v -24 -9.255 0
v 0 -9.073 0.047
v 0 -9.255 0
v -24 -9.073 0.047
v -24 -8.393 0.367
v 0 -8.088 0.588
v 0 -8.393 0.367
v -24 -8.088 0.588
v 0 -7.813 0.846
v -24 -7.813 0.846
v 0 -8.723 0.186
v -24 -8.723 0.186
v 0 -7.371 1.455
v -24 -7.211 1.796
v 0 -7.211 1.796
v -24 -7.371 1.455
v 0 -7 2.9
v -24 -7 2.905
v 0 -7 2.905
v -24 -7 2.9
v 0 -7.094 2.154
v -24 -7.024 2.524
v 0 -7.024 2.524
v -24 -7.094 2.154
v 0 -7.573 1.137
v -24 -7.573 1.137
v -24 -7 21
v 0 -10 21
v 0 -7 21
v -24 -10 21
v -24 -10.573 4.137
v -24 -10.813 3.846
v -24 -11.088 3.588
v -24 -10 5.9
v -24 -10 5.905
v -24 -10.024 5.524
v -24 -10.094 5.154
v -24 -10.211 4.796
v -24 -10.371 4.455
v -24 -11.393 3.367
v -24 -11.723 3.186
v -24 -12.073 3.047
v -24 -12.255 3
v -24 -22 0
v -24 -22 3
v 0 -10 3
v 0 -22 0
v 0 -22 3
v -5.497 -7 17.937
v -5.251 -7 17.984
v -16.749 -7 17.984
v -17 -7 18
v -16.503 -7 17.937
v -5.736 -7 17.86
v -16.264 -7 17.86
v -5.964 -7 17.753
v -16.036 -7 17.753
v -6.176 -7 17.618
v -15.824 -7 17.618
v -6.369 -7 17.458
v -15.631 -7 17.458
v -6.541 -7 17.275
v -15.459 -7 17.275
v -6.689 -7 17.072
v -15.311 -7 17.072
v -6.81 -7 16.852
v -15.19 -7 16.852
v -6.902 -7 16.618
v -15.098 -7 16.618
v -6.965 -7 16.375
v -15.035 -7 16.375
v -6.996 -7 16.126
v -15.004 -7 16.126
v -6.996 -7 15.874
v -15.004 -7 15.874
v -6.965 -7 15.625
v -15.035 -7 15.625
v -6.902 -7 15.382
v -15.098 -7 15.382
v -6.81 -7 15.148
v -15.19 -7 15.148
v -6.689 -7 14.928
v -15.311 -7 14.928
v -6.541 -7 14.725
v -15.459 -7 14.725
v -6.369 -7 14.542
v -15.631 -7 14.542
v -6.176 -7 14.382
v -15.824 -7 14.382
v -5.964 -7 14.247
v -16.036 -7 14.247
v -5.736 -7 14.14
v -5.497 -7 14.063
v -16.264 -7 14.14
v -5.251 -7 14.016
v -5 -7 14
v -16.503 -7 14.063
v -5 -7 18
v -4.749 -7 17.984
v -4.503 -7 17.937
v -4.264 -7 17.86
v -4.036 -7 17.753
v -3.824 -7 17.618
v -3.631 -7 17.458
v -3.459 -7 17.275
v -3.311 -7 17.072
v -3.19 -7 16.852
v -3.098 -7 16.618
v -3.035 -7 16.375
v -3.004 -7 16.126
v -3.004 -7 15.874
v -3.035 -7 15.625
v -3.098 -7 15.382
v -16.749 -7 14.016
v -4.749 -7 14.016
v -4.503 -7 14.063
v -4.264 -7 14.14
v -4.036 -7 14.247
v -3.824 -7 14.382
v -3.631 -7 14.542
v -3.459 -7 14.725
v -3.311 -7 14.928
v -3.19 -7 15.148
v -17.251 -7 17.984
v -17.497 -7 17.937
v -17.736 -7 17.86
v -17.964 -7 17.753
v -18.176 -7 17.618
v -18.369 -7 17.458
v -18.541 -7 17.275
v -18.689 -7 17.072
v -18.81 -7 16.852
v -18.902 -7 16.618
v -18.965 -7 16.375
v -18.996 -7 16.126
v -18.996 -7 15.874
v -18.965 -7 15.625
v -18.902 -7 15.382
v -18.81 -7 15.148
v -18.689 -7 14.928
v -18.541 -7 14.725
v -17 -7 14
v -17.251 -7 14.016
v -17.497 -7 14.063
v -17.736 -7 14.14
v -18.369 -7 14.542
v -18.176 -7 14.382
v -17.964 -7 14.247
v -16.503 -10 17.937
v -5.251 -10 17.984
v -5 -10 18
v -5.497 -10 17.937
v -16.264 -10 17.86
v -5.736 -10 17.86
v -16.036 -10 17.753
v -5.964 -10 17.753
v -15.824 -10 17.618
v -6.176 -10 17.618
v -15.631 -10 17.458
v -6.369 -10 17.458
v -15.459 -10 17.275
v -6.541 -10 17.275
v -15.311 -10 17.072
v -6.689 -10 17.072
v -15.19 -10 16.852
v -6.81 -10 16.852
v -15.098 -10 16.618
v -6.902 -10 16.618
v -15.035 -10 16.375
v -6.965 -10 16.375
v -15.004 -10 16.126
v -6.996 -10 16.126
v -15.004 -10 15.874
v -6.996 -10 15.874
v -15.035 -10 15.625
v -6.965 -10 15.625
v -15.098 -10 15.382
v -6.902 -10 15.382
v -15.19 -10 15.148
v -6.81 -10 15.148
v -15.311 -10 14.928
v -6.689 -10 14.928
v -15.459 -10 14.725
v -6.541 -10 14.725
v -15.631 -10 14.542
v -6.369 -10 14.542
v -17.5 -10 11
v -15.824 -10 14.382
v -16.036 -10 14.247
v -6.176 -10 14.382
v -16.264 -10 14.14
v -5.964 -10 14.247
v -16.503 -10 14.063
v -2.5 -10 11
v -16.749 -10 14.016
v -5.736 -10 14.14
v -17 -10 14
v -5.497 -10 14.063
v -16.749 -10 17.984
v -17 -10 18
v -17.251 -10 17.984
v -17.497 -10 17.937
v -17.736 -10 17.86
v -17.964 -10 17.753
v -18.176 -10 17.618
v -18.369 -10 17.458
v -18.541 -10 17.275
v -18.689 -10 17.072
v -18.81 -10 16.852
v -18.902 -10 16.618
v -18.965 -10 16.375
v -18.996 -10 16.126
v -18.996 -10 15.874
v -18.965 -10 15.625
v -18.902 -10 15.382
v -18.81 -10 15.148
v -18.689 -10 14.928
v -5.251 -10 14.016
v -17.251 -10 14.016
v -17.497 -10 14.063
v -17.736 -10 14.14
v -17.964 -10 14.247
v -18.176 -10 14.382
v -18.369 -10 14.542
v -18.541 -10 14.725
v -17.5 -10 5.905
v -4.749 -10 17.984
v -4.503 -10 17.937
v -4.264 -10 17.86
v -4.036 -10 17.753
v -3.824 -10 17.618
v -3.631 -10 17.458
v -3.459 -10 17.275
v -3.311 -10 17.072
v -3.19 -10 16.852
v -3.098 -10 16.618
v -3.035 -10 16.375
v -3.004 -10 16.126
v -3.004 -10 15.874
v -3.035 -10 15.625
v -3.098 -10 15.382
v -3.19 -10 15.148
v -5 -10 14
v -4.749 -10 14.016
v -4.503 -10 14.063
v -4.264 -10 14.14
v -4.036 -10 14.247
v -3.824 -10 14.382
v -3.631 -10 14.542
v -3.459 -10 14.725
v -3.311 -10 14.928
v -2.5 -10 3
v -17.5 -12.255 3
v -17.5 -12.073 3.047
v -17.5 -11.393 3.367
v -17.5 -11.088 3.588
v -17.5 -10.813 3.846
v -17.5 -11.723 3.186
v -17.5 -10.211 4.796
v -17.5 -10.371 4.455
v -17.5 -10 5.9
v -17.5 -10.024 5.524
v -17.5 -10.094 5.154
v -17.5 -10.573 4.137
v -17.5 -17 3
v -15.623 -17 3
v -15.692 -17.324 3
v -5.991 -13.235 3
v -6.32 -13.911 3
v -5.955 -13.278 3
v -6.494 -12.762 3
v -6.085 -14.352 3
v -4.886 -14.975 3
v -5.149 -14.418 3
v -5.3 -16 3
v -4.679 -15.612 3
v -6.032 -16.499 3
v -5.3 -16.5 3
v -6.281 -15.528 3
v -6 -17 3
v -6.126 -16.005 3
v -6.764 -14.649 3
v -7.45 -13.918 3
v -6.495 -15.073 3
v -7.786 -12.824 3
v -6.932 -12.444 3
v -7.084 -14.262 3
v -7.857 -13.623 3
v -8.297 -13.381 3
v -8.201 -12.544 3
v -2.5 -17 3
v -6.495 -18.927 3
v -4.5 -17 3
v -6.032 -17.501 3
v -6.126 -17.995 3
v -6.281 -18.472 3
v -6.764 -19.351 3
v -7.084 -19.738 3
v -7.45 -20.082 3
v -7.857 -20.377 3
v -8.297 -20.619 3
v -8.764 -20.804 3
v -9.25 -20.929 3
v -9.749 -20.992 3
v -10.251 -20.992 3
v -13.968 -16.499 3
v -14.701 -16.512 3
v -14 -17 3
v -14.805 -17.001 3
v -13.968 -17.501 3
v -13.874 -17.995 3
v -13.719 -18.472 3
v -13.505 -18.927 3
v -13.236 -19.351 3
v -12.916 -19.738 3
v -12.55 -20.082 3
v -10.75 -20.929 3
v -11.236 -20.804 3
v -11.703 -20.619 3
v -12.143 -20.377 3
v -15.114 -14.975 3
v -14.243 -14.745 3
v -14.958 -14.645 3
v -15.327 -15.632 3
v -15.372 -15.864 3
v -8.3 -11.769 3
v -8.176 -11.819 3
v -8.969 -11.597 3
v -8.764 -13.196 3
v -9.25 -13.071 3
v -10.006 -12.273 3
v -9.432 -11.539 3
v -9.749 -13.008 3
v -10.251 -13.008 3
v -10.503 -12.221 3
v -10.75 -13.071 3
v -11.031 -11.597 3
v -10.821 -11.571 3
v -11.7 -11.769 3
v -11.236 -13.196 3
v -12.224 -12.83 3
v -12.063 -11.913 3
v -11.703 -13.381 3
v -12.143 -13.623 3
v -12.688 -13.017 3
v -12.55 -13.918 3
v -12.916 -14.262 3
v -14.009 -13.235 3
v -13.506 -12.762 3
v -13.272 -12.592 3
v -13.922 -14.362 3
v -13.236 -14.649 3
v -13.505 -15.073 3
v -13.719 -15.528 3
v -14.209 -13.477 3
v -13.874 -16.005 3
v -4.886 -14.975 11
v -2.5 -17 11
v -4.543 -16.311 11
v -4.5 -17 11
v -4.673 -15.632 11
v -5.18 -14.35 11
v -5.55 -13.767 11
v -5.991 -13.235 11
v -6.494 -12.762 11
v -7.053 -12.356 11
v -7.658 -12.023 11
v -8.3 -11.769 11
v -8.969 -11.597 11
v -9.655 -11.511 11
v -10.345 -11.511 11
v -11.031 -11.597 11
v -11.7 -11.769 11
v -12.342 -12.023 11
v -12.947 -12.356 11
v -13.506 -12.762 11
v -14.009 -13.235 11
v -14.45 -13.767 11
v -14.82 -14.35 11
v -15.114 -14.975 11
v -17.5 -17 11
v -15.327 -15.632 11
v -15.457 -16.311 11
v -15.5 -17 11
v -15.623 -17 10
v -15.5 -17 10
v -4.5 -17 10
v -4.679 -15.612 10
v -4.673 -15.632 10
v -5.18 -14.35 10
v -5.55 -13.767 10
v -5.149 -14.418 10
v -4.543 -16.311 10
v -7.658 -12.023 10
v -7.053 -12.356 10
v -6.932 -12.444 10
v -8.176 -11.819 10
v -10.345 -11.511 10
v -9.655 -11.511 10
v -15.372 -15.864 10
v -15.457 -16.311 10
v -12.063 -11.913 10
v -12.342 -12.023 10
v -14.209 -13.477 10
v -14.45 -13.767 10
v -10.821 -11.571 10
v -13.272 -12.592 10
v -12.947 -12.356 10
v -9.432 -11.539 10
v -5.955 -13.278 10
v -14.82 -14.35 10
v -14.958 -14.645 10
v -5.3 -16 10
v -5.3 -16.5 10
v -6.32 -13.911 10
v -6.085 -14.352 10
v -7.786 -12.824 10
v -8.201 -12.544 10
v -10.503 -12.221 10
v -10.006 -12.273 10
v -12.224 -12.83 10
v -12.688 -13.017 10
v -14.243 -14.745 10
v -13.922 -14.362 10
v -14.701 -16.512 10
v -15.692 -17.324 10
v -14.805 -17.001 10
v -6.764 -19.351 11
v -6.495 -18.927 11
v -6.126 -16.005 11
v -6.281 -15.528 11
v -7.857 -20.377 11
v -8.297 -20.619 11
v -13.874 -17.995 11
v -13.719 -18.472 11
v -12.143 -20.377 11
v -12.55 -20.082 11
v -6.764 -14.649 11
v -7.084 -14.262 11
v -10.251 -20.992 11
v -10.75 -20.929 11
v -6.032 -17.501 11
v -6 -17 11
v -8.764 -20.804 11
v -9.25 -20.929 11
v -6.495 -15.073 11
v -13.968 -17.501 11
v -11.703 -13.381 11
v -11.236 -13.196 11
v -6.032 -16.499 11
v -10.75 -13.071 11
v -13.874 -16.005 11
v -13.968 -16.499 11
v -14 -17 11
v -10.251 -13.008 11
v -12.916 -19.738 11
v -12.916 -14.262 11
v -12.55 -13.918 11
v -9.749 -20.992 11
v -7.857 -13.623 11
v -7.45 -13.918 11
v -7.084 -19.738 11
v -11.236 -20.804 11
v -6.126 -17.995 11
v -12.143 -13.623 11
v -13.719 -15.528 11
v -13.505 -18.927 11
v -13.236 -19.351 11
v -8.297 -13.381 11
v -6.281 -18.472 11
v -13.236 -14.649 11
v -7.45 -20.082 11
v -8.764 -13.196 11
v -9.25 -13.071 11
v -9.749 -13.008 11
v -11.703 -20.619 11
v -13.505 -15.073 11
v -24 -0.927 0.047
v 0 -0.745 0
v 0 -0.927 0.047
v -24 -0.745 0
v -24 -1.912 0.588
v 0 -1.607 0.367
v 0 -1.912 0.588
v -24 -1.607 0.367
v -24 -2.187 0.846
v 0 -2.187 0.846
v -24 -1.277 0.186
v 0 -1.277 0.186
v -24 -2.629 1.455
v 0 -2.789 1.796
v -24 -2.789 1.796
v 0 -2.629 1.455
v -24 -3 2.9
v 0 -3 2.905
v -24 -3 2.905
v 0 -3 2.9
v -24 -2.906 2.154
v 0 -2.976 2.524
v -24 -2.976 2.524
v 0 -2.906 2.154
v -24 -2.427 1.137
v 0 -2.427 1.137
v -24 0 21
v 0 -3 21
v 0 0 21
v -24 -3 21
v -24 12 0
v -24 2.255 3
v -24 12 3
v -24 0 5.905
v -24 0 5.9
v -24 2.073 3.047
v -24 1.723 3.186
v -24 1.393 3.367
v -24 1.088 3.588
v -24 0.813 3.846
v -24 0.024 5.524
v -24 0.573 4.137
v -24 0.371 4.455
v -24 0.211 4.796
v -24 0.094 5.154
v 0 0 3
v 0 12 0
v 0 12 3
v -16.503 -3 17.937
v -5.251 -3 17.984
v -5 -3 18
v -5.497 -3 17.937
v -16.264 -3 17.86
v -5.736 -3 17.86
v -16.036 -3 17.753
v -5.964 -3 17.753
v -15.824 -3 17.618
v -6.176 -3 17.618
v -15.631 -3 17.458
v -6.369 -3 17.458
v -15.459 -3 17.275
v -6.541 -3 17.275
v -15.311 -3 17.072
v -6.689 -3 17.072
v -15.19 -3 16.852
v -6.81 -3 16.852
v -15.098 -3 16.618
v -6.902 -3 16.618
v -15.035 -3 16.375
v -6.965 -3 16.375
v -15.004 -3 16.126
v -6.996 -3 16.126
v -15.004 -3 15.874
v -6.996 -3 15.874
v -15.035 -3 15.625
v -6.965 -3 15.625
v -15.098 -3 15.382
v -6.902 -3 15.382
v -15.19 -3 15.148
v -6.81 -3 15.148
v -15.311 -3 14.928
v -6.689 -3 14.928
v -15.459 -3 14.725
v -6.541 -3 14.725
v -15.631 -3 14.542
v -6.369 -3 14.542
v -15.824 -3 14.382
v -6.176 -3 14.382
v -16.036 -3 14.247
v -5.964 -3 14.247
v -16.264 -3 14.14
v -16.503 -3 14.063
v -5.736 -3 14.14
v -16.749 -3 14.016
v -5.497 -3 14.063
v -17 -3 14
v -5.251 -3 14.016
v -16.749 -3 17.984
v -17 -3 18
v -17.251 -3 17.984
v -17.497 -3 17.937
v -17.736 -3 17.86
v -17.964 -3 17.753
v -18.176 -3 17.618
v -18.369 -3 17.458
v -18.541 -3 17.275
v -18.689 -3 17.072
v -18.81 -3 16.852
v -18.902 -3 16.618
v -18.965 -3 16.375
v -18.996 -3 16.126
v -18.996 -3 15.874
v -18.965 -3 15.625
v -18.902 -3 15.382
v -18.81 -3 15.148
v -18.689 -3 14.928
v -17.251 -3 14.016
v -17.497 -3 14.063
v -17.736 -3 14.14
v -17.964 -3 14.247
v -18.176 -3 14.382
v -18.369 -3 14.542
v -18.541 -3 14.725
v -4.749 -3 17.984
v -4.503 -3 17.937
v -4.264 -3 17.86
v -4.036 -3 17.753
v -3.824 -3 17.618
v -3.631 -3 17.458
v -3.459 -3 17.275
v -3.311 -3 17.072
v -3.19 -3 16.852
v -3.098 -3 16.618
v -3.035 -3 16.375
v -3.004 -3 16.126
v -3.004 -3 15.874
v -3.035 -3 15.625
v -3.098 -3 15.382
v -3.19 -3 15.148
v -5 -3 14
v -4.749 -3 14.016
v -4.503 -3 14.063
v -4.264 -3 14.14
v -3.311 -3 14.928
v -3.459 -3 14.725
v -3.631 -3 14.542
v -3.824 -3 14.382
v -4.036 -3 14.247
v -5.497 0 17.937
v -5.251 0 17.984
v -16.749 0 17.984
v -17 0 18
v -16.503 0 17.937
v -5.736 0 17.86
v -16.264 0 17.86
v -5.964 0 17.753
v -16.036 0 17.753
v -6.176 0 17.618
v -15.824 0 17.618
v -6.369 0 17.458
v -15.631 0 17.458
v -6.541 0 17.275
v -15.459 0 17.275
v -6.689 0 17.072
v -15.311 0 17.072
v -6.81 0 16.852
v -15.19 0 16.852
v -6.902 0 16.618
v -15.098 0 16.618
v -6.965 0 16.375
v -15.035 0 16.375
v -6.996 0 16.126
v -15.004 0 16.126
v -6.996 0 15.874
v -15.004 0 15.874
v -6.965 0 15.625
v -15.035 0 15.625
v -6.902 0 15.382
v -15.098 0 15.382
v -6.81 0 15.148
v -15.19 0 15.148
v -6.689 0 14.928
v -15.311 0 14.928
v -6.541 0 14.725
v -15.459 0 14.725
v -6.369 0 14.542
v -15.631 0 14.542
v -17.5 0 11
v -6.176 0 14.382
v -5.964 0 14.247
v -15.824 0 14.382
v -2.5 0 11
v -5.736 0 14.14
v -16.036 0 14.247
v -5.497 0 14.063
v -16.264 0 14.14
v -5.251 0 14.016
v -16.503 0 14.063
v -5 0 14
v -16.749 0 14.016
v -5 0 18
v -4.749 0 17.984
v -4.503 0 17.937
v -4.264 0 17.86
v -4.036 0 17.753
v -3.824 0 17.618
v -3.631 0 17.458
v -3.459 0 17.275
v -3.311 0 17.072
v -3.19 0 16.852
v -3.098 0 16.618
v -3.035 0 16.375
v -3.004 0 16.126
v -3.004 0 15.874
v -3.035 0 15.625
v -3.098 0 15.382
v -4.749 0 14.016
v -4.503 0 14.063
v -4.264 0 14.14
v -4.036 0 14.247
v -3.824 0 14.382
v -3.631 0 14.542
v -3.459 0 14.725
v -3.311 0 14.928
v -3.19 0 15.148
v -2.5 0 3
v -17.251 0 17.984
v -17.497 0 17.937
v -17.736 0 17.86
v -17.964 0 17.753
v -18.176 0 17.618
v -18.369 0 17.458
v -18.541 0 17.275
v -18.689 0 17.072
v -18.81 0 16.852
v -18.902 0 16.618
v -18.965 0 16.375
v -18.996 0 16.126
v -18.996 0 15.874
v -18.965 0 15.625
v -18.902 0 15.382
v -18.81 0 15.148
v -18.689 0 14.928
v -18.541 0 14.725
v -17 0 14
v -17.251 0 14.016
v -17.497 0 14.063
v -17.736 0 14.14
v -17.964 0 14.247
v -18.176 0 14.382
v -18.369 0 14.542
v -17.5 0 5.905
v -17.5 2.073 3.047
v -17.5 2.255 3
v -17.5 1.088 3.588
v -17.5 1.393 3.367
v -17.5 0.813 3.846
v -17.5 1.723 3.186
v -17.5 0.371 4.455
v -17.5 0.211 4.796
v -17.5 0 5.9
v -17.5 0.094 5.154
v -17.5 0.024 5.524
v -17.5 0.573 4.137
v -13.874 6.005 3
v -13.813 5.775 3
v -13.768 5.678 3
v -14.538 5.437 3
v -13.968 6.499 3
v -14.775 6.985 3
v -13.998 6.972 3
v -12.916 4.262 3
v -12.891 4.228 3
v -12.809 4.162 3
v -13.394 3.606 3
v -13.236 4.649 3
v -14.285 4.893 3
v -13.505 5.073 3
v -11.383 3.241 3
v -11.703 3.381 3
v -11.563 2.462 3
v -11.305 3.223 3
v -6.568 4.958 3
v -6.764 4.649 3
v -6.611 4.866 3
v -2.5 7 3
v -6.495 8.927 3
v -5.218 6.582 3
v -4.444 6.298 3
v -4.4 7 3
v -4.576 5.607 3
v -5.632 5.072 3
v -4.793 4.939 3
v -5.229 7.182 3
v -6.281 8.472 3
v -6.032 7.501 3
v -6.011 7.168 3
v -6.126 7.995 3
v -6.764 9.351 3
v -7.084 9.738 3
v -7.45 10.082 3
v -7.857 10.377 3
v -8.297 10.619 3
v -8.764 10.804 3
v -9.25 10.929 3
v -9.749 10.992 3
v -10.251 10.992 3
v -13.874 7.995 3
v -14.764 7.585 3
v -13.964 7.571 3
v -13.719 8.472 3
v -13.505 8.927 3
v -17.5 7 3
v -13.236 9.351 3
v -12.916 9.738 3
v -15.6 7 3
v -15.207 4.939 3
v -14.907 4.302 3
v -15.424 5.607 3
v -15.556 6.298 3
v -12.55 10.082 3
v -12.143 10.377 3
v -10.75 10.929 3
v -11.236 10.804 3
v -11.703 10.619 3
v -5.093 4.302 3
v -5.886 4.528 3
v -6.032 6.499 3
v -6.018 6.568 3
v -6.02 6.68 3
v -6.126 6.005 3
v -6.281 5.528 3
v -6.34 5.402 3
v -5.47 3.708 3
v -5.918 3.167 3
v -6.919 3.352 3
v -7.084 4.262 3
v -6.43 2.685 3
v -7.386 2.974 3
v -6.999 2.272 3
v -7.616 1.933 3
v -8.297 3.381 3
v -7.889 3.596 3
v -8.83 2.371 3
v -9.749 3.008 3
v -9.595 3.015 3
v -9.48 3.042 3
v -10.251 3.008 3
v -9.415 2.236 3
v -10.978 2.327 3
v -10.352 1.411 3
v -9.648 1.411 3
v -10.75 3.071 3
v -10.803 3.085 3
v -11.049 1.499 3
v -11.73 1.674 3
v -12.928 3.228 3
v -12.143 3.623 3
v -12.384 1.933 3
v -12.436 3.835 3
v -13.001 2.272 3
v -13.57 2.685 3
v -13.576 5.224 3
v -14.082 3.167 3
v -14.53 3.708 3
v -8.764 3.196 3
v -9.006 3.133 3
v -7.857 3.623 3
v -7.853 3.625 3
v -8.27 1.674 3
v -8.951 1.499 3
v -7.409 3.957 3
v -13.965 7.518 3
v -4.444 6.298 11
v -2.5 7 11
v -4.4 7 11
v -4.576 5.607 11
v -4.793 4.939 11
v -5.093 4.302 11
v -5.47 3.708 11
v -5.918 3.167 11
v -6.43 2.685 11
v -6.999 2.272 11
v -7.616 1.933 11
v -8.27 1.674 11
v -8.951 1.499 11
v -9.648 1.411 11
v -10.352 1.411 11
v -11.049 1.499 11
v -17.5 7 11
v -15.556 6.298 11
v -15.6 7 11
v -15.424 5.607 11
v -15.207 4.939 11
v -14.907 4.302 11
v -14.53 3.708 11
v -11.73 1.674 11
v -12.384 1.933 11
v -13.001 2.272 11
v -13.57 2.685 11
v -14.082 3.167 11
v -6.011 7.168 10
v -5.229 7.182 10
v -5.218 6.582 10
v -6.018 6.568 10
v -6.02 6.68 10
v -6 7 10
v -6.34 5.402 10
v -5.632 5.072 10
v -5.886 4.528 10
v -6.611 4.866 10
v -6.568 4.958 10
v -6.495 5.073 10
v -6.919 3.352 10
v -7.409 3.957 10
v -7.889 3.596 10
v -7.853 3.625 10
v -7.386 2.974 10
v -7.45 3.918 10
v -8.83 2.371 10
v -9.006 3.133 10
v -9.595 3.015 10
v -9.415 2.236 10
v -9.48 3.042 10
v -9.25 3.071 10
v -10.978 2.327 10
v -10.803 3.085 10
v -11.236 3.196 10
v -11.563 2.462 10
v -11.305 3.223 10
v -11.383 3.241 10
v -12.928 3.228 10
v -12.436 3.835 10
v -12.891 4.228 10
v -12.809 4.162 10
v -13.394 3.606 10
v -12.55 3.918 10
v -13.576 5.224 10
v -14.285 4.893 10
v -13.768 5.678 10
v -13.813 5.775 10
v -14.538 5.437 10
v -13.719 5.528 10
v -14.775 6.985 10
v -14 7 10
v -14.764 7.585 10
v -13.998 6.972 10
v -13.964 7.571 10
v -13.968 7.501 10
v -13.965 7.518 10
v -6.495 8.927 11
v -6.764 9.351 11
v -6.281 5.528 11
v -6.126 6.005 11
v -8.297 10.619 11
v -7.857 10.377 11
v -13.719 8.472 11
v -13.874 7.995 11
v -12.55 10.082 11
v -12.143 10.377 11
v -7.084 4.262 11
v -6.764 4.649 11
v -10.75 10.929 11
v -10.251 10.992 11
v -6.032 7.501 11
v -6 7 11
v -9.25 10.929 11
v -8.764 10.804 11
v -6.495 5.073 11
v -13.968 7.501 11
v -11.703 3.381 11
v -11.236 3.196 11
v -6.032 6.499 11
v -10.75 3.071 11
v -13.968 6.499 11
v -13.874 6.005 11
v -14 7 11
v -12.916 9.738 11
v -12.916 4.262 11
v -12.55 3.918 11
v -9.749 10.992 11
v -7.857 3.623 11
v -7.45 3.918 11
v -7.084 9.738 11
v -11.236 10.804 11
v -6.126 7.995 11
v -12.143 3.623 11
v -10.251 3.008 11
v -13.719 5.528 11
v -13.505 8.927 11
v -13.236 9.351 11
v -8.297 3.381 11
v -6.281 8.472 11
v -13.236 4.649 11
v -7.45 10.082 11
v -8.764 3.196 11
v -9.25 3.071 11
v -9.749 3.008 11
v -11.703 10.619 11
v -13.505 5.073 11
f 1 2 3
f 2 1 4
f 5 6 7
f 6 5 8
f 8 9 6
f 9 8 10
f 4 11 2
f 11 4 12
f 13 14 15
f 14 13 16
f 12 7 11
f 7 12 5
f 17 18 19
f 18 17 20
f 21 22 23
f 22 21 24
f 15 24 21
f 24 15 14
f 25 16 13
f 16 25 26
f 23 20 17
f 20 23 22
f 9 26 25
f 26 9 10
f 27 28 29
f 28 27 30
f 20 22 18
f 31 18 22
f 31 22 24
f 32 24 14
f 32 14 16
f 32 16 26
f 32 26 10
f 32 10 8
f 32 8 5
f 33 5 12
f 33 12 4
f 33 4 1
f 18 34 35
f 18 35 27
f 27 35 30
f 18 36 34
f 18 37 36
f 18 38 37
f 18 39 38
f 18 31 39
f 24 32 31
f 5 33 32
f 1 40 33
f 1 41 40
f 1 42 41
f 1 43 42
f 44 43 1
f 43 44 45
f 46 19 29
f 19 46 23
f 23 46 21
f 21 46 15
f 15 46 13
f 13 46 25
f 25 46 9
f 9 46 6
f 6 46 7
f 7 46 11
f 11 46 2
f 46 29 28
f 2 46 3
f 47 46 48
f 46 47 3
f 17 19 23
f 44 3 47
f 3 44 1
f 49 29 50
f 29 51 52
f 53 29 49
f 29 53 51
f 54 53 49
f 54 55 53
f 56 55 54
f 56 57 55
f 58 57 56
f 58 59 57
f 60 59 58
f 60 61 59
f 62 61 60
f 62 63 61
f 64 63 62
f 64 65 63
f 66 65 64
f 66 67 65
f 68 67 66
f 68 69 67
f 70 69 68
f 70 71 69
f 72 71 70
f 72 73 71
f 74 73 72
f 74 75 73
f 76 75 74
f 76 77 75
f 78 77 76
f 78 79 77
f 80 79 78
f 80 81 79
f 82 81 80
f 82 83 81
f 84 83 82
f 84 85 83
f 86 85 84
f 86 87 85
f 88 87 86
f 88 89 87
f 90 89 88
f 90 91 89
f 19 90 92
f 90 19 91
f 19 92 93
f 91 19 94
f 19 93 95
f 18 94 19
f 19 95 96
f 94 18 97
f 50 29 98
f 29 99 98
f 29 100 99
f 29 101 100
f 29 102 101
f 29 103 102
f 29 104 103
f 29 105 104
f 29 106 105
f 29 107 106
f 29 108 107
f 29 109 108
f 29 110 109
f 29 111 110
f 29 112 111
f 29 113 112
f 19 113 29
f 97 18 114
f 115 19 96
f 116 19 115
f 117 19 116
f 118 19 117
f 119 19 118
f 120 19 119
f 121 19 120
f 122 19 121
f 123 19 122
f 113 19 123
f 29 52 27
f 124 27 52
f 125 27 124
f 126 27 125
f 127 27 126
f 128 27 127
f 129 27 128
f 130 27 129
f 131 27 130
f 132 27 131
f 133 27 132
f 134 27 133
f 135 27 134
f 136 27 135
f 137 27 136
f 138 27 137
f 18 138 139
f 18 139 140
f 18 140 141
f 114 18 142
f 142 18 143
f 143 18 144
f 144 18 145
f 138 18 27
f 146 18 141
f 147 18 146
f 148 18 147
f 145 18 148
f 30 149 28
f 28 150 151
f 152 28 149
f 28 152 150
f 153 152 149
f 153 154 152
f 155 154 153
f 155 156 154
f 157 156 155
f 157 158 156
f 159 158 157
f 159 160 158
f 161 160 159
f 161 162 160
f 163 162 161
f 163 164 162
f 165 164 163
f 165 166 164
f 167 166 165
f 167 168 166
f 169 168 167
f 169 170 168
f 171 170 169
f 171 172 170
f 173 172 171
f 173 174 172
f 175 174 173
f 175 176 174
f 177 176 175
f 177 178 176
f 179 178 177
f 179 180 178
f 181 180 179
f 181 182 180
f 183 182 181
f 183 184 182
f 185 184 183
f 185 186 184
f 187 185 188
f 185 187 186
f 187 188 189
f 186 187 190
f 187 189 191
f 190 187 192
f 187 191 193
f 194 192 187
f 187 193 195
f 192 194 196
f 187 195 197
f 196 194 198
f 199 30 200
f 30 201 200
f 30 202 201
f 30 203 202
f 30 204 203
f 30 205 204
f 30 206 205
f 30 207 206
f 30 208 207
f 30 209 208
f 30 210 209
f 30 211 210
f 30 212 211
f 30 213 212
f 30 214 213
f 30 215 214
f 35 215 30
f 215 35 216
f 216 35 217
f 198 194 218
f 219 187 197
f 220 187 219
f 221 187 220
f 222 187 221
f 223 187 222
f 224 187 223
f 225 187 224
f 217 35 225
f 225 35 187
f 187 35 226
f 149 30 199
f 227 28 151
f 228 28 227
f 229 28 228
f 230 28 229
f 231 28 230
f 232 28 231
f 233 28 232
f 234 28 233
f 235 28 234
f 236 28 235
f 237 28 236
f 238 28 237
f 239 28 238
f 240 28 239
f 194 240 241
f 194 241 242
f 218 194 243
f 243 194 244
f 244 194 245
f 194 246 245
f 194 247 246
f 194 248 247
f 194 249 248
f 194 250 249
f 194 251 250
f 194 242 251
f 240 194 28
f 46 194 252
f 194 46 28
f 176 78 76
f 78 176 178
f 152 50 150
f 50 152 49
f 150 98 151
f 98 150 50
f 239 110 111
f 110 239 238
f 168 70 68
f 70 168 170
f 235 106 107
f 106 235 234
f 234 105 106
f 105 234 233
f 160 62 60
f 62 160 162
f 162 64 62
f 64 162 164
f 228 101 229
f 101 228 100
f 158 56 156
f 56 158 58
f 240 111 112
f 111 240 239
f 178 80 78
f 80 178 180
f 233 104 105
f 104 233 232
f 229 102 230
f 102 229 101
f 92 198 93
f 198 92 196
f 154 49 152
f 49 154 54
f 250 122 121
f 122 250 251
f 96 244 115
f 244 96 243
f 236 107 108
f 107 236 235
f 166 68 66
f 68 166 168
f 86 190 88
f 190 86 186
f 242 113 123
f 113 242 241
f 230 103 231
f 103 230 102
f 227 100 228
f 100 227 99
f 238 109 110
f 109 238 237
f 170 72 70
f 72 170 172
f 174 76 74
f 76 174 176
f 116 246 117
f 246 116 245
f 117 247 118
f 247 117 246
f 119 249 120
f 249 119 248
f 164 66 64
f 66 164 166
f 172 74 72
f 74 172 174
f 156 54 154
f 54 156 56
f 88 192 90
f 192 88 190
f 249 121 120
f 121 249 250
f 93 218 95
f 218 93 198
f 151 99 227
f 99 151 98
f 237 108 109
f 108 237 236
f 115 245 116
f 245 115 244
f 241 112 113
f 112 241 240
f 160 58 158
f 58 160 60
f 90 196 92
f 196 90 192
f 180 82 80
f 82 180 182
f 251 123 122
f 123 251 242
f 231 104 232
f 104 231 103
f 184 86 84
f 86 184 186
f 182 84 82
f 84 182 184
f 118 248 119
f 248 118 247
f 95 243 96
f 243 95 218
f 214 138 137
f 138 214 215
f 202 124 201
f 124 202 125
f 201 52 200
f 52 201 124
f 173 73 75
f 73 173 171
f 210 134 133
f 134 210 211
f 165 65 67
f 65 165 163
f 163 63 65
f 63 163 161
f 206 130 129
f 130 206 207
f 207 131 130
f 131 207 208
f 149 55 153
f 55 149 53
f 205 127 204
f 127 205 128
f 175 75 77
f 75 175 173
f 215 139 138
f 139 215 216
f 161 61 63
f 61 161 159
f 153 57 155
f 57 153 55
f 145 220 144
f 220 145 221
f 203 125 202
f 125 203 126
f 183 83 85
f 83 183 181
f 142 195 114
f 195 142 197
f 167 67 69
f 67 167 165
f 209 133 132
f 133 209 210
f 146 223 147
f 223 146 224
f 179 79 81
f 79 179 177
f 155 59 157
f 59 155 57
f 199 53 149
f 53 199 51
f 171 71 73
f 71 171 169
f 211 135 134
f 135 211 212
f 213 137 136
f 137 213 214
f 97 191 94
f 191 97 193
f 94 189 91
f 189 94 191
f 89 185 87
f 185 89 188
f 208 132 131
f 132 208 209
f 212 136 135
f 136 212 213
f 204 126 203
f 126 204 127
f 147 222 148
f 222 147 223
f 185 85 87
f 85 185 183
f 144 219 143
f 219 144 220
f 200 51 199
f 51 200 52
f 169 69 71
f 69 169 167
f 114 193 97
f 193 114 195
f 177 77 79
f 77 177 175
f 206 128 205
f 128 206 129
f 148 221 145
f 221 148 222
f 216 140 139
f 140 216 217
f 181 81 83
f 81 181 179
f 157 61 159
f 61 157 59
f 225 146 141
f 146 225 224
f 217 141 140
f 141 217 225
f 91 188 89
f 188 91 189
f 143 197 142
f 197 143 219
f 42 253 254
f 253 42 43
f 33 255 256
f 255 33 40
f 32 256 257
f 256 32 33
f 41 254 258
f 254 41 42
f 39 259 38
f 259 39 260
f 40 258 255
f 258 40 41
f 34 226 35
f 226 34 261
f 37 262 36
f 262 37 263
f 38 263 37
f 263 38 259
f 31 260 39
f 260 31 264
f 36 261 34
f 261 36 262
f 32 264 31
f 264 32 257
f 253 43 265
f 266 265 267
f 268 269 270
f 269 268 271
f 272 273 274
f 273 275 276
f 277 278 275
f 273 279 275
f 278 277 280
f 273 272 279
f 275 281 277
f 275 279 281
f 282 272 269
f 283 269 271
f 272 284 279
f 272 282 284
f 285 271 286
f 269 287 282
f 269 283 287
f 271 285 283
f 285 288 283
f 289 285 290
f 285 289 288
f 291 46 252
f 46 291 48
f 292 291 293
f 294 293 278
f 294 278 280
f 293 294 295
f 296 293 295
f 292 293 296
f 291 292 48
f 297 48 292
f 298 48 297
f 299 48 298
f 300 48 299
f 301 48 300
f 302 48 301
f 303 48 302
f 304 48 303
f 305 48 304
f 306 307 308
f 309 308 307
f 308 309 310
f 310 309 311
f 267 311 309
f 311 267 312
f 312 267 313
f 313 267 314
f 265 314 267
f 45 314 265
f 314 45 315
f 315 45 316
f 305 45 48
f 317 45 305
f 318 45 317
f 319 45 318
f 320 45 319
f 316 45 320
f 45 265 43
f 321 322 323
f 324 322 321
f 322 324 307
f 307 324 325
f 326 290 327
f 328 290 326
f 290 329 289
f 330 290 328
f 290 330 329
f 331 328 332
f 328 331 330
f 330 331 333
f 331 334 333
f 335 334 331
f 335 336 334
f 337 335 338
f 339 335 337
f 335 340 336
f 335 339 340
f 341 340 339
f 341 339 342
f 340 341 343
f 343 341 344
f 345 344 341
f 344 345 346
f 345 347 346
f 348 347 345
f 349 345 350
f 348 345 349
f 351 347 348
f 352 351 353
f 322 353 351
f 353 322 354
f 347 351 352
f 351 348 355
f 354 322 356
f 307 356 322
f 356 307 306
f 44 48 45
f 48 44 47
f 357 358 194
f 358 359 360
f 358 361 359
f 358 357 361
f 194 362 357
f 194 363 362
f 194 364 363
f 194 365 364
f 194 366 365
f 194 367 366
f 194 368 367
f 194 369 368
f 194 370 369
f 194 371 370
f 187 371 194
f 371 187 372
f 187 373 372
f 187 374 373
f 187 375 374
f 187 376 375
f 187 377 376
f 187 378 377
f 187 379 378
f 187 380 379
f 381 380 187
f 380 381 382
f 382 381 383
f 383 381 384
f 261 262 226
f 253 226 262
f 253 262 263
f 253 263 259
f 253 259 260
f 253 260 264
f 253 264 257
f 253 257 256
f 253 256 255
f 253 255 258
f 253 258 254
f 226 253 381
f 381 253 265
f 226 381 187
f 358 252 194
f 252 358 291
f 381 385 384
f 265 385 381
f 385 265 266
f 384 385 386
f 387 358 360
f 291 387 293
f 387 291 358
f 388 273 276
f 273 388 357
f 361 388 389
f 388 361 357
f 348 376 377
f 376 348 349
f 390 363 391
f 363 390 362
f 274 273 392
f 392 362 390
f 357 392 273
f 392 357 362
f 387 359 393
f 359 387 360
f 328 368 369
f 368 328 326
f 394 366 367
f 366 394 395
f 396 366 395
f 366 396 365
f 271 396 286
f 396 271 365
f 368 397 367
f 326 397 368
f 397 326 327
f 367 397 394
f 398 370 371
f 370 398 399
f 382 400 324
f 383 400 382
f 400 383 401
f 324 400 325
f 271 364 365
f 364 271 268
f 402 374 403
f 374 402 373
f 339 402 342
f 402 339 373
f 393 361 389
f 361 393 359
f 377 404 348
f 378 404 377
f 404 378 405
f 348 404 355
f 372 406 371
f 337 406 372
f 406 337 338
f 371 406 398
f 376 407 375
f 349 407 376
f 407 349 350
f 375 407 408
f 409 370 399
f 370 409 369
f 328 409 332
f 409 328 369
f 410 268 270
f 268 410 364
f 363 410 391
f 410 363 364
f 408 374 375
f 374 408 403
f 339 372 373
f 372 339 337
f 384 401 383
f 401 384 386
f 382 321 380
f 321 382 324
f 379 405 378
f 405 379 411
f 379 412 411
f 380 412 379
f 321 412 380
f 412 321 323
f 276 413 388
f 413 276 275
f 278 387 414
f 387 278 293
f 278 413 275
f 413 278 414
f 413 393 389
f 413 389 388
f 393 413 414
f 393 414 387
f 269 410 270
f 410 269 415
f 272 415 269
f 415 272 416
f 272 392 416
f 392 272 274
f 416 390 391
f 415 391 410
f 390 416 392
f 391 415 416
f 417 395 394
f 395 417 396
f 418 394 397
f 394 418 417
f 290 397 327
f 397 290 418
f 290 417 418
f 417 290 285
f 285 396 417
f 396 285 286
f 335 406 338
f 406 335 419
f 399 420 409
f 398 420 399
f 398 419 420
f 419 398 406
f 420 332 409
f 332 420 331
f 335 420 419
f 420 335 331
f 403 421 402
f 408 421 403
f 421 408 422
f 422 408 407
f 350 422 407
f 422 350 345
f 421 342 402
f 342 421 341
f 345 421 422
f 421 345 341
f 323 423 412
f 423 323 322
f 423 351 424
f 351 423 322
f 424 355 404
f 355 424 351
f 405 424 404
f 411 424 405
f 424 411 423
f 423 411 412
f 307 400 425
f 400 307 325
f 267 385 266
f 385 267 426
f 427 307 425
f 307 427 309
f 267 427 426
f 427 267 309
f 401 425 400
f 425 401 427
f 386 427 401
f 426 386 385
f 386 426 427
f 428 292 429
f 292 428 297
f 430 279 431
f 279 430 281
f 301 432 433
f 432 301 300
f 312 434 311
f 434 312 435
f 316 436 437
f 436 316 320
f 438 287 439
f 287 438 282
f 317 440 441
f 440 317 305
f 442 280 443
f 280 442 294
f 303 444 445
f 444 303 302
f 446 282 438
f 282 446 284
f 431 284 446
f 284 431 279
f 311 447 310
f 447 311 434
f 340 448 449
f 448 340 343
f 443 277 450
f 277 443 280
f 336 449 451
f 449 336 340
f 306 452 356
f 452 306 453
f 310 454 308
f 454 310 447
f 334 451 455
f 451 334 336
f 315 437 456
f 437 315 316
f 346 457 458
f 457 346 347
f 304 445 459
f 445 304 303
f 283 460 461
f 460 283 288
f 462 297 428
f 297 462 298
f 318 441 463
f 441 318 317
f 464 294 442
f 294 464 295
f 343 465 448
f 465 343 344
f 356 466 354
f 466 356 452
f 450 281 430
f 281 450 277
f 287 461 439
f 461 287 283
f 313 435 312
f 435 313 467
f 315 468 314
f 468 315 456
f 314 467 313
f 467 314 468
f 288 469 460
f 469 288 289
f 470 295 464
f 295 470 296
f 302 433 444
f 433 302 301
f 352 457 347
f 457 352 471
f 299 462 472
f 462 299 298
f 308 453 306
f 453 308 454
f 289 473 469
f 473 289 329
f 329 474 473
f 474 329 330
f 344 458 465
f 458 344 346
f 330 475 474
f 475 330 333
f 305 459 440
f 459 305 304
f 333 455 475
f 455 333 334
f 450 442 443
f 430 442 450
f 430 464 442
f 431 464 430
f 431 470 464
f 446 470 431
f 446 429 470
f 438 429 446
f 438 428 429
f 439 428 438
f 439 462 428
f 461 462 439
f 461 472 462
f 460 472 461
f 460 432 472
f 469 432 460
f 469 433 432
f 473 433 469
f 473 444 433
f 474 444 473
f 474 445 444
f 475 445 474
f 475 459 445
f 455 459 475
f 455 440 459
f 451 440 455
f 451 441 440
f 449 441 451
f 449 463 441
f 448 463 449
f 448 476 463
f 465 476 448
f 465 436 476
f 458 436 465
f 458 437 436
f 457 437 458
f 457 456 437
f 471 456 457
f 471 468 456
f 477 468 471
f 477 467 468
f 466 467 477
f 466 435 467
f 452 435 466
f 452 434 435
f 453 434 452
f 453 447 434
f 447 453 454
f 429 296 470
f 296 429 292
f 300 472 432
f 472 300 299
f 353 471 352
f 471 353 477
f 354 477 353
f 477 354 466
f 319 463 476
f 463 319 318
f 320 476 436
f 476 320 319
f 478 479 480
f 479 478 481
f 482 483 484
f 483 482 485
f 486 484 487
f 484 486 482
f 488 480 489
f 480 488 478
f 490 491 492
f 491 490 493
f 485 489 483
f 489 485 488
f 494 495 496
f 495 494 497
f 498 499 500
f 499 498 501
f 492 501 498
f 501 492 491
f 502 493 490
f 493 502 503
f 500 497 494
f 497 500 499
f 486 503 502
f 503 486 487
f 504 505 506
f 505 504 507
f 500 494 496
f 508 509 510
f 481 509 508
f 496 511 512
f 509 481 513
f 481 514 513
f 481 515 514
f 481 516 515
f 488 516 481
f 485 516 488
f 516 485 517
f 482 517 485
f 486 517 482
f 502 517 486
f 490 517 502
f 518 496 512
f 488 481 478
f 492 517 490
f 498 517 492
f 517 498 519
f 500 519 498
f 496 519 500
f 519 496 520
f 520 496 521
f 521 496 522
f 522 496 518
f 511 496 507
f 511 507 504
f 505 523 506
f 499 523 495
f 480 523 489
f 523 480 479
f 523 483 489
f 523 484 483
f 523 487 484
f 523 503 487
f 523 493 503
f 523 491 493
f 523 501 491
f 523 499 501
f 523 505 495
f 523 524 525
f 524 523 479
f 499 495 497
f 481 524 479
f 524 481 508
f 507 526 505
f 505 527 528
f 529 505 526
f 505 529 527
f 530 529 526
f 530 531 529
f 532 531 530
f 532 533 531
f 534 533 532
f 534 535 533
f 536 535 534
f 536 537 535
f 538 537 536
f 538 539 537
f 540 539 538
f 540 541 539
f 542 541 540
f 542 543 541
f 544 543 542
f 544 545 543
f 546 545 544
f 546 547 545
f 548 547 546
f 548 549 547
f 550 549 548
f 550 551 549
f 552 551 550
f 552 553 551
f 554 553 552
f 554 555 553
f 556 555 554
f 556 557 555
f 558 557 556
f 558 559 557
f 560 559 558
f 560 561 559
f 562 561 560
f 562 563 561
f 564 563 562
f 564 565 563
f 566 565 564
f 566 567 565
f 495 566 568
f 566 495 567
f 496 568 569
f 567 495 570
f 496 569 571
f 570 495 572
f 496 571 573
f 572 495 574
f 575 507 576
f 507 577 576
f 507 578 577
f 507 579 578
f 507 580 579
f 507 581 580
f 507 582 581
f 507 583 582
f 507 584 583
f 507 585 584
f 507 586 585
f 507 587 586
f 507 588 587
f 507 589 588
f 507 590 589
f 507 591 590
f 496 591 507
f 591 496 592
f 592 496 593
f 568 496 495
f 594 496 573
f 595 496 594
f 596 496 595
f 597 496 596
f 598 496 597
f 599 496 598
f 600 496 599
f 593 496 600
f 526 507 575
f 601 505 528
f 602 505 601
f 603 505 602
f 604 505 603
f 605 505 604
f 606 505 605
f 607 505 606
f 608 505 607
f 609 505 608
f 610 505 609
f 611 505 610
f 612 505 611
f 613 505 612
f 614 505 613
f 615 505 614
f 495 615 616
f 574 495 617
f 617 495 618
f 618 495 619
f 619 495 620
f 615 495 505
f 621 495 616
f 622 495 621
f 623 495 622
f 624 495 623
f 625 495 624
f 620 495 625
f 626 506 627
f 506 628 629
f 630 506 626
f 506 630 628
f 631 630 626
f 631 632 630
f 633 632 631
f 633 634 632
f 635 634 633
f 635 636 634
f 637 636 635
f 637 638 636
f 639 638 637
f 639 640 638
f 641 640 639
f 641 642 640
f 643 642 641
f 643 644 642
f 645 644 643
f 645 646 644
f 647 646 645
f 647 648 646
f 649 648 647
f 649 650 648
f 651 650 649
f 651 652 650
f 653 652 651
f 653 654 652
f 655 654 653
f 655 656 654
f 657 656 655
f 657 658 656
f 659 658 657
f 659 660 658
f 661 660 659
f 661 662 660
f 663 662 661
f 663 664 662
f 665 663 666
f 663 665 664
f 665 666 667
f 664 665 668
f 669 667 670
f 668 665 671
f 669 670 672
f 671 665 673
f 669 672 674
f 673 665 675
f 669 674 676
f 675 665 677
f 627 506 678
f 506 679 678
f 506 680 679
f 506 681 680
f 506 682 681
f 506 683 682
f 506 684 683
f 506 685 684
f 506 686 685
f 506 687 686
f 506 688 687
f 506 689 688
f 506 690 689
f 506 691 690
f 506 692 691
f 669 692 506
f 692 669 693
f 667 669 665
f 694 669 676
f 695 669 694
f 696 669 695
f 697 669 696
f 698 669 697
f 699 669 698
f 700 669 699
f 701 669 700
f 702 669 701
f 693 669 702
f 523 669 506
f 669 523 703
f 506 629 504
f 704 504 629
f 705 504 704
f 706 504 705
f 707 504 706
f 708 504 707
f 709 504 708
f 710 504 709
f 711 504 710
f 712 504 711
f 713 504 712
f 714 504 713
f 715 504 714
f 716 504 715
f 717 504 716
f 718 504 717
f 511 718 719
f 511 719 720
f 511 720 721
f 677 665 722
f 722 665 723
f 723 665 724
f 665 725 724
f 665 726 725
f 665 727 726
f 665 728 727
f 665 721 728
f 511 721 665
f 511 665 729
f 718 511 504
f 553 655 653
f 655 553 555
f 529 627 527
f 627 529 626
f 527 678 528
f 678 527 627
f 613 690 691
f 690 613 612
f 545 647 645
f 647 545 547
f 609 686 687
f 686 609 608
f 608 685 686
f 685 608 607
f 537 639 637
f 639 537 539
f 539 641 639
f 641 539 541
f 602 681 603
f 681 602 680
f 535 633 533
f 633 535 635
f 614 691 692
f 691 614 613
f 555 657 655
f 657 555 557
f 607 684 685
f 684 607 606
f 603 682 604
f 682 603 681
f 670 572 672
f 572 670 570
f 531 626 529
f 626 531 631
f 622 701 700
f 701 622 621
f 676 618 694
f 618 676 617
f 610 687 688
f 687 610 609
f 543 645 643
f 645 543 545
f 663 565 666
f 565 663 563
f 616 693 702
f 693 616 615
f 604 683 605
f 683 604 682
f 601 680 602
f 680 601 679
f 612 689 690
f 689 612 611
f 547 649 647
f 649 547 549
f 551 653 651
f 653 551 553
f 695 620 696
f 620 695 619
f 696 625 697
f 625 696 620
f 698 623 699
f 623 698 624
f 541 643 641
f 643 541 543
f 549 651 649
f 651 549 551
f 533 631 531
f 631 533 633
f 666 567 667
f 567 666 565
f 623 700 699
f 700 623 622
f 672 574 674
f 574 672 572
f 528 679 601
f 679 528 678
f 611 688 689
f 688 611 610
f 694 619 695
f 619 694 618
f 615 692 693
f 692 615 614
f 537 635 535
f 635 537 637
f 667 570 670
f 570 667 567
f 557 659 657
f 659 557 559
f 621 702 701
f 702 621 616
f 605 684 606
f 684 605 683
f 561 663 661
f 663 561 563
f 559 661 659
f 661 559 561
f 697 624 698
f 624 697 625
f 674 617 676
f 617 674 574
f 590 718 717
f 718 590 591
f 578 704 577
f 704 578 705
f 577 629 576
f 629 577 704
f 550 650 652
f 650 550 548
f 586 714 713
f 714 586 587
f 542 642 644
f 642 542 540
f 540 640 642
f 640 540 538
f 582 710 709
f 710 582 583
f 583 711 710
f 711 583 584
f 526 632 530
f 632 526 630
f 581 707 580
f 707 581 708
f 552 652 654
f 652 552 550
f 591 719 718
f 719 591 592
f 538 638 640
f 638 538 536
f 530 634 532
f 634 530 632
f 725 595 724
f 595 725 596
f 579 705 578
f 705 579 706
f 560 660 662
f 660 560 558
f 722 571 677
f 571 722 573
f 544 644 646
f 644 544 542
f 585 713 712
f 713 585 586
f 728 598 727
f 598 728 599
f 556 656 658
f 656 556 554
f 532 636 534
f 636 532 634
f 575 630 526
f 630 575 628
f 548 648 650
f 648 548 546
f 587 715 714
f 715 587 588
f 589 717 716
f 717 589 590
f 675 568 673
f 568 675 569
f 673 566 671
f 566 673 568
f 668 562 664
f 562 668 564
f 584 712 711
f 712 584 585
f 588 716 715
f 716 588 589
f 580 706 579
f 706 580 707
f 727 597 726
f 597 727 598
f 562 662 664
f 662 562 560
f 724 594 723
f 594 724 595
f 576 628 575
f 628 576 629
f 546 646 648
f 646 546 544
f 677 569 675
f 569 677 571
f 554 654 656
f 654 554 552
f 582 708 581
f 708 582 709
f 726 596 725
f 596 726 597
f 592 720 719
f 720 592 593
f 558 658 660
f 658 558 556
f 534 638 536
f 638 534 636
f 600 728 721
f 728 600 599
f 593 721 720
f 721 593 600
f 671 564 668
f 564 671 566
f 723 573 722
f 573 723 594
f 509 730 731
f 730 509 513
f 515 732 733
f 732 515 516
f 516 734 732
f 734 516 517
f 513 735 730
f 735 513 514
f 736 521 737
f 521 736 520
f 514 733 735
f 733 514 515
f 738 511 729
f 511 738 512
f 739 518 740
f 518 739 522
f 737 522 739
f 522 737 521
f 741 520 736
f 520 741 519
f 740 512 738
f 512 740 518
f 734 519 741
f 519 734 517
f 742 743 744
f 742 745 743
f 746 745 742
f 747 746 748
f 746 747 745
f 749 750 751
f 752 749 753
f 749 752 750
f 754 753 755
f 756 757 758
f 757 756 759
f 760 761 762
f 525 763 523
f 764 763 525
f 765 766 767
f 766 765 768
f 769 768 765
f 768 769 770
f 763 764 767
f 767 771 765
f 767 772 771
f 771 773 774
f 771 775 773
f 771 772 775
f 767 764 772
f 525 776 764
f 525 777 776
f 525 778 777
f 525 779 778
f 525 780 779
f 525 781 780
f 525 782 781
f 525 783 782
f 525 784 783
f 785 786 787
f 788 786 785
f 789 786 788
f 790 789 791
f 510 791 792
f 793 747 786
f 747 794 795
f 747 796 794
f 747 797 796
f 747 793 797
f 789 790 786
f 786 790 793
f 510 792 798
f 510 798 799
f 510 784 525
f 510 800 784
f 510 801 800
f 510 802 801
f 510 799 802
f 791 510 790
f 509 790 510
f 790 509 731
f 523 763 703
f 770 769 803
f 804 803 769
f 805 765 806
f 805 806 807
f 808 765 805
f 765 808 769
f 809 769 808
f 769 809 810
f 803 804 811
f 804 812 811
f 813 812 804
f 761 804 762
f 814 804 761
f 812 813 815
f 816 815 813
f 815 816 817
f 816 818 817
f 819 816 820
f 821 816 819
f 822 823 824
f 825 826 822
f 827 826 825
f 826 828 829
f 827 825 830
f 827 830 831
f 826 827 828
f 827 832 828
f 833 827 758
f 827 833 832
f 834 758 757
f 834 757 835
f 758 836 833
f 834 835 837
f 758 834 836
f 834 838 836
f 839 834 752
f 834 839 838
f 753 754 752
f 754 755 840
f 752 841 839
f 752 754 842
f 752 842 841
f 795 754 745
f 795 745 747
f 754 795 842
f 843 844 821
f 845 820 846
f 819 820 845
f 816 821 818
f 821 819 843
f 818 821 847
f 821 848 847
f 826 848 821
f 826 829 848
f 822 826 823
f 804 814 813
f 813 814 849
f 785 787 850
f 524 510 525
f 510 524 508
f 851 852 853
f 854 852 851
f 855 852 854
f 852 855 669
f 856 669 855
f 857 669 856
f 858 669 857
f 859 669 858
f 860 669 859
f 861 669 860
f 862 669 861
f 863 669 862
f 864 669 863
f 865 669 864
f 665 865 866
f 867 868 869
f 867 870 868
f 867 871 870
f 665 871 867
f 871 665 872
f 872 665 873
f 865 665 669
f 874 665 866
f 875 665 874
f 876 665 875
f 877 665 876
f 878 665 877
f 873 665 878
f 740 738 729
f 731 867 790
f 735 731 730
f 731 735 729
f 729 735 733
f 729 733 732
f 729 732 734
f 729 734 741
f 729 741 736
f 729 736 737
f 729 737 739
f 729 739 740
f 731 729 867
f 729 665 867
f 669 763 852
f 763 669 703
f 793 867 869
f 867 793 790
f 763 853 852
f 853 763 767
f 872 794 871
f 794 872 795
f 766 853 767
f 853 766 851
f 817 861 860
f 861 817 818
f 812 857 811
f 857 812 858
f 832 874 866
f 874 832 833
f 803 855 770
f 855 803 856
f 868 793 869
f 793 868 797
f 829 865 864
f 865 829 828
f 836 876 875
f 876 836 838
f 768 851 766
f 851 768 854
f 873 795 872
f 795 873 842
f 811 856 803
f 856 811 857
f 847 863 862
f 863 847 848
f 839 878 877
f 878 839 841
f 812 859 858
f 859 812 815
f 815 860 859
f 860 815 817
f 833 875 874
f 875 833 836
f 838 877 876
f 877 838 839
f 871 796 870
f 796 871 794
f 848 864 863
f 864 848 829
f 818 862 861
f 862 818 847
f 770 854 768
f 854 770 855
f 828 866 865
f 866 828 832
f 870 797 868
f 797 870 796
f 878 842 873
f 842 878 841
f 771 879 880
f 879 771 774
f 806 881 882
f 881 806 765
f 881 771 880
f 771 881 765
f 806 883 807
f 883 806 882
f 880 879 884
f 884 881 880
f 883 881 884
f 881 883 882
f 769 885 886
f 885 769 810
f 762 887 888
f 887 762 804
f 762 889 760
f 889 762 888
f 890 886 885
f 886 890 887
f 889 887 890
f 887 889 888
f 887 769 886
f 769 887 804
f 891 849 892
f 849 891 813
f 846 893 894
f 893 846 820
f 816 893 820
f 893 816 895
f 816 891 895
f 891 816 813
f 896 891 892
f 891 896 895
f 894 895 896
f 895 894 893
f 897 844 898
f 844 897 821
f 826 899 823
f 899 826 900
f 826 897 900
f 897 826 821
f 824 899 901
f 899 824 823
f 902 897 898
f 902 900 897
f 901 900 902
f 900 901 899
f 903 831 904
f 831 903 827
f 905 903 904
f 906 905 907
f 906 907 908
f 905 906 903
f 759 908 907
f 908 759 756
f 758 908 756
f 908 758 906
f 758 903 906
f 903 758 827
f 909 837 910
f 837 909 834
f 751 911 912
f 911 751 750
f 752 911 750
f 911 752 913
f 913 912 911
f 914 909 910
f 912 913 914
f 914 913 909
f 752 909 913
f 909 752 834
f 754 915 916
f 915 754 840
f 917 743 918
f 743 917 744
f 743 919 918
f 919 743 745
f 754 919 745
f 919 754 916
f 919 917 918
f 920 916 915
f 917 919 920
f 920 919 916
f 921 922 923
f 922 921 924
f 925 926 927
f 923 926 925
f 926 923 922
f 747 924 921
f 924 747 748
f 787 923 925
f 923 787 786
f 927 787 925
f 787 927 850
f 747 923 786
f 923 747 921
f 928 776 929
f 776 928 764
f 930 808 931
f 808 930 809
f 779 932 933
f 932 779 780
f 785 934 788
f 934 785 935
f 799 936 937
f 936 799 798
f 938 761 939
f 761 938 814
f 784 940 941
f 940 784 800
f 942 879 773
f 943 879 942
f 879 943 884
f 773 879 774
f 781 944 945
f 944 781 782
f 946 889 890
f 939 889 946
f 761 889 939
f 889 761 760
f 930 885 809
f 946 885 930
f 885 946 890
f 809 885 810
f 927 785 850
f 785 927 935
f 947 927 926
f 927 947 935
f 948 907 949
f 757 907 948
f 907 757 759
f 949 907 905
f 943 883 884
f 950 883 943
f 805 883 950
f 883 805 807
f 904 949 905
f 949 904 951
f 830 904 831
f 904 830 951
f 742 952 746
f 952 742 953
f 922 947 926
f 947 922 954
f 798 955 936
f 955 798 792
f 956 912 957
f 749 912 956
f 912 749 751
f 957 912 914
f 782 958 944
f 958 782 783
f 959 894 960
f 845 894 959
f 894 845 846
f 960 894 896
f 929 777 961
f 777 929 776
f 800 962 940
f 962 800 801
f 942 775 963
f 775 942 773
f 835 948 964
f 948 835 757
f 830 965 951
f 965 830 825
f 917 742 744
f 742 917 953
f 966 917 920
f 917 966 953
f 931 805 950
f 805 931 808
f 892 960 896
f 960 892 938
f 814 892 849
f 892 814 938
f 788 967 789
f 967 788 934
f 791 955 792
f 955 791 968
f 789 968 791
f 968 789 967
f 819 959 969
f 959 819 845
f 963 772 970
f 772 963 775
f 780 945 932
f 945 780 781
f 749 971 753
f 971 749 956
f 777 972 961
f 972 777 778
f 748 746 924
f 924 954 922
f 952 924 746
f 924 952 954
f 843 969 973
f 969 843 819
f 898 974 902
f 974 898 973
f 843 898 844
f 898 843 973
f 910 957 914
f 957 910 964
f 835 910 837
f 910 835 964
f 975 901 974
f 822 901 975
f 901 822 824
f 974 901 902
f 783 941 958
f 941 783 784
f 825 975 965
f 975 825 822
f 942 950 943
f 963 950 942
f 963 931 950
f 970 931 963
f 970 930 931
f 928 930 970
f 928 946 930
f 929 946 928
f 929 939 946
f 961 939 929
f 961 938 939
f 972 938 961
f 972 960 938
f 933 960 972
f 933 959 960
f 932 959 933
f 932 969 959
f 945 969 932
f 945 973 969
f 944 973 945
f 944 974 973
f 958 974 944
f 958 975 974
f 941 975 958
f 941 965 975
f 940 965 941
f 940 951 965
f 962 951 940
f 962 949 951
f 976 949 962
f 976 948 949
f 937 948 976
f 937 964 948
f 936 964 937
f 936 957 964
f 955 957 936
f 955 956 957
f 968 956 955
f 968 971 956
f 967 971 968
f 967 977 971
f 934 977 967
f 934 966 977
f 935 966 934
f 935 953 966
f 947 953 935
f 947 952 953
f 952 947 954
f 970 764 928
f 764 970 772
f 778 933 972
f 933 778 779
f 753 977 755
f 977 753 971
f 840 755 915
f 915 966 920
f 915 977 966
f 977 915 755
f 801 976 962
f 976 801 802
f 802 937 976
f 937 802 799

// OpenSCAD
$fn=50;

module fillet(r, h) {
    translate([r / 2, r / 2, 0])

        difference() {
            cube([r + 0.01, r + 0.01, h], center = true);

            translate([r/2, r/2, 0])
                cylinder(r = r, h = h + 1, center = true);

        }
}

module tooth(xpos,ypos,zpos,rot) {
	zHeight = 1.5;
	xLength = 7;
	yDepth = -0.8;
	a = 0.5;

	translate([xpos,ypos,zpos]) {
		rotate([rot,0,0]){
		polyhedron(
			points=[[0,0,0] , [0,0,zHeight] , [xLength,0,zHeight] , [xLength,0,0] ,[0,yDepth,a] , [0,yDepth,(zHeight-a)] , [xLength,yDepth,(zHeight-a)] , [xLength,yDepth,a]],
			triangles=[[0,2,1],[0,3,2], [0,1,4],[1,5,4], [0,4,7],[0,7,3], [4,5,6],[4,6,7], [5,1,6],[6,1,2], [3,7,6],[3,6,2] 
			]);
		}
	}
}

module tooth2(xpos,ypos,zpos,rot) {
	zHeight = 0.6;
	xLength = 7;
	yDepth = 0.8;
	a = 0.5;

	translate([xpos,ypos ,zpos]) {
		rotate([rot+6,0,0]){
			cube([xLength, yDepth, zHeight]);
		}
	}
}

module backPlate(thick, holeRad, height1, trapZpos, r) {
	//back with 2 holes
	difference() { 
		difference() { cube([21,thick,height1]); translate ([-0.10,r,height1/2]) rotate([0,0,-90]) fillet(r, height1+2);}
		union() {
			translate([16,4,trapZpos-5]) rotate([90,0,0]) cylinder(thick+2,holeRad,holeRad);
			translate([16,4,trapZpos+7]) rotate([90,0,0]) cylinder(thick+2,holeRad,holeRad); 
		}
	}
}
module sidePlate(thick, height1, blockH, r) {

	//left side
	union() { translate([0,-12,0]) cube([thick,12,height1]); translate ([2.9,0,19.5]) rotate([0,0,-90]) fillet(r, height1-blockH);}

}
module spiggot(ypos, trapZpos, rad, trapW) {
	//smooth spigot, belt trap
	translate([3, ypos, trapZpos]) rotate([0,90,0]) cylinder(trapW, rad, rad);
}
module outerBlock(spigYpos, spigR, trapGap, trapZpos, trapW, blockH) {
	//outerblock, belt trap
	difference() {
		translate([3,spigYpos, trapZpos-7.5]) cube([trapW,10,blockH]);
		translate([2,spigYpos, trapZpos]) rotate([0,90,0]) cylinder(trapW + 2, spigR + trapGap, spigR + trapGap);
	}
}


r = 3; //chamfer raduis

trapWidth = 8;
spigRad = 4; //radius
trapGap = 1.5;
trapZpos = 10;
spigYpos = -7;

screwHoleRad = 2;
backThick = 3;
sideThick = 3;

Height = 24;
blockHeight = 15;
toothAngleStep = 28;
toothAngleStep2 = toothAngleStep -2;
rotAdjust = 6;
rotAdjustMirror =  85;


rotate([0,-90,0]) {	

//Left	Hand	
translate([0,-10,0]) {
	backPlate(backThick, screwHoleRad, Height, trapZpos, r );
	sidePlate(backThick, Height, blockHeight, r);
	spiggot(spigYpos, trapZpos, spigRad, trapWidth) ;
	outerBlock(spigYpos, spigRad, trapGap, trapZpos, trapWidth, blockHeight) ;

	for (z = [-3 : 3]) {
		color("blue") tooth(
		sideThick, 
		(((spigRad+trapGap ) * cos ((toothAngleStep * z)-rotAdjust)) + spigYpos), 
		(((spigRad+trapGap ) * sin ((toothAngleStep * z)-rotAdjust)) + trapZpos),
		(toothAngleStep * z)-rotAdjust
		);
	}
}

//Right Hand
mirror([0,1,0]) {
	backPlate(backThick, screwHoleRad, Height, trapZpos, r );
	sidePlate(backThick, Height, blockHeight, r);
	spiggot(spigYpos, trapZpos, spigRad, trapWidth) ;
	outerBlock(spigYpos, spigRad, trapGap+0.1, trapZpos, trapWidth, blockHeight) ;

	
	for (z = [0 : 7]) {
		color("red") tooth2(
			sideThick, 
			(((spigRad + 0.8 )* cos ((toothAngleStep2 * z)-rotAdjustMirror)) + spigYpos), 
			(((spigRad  + 0.8 )* sin ((toothAngleStep2 * z)-rotAdjustMirror)) + trapZpos),
			((toothAngleStep2 ) * z) + 168 - rotAdjustMirror
		);
	}
}

}
